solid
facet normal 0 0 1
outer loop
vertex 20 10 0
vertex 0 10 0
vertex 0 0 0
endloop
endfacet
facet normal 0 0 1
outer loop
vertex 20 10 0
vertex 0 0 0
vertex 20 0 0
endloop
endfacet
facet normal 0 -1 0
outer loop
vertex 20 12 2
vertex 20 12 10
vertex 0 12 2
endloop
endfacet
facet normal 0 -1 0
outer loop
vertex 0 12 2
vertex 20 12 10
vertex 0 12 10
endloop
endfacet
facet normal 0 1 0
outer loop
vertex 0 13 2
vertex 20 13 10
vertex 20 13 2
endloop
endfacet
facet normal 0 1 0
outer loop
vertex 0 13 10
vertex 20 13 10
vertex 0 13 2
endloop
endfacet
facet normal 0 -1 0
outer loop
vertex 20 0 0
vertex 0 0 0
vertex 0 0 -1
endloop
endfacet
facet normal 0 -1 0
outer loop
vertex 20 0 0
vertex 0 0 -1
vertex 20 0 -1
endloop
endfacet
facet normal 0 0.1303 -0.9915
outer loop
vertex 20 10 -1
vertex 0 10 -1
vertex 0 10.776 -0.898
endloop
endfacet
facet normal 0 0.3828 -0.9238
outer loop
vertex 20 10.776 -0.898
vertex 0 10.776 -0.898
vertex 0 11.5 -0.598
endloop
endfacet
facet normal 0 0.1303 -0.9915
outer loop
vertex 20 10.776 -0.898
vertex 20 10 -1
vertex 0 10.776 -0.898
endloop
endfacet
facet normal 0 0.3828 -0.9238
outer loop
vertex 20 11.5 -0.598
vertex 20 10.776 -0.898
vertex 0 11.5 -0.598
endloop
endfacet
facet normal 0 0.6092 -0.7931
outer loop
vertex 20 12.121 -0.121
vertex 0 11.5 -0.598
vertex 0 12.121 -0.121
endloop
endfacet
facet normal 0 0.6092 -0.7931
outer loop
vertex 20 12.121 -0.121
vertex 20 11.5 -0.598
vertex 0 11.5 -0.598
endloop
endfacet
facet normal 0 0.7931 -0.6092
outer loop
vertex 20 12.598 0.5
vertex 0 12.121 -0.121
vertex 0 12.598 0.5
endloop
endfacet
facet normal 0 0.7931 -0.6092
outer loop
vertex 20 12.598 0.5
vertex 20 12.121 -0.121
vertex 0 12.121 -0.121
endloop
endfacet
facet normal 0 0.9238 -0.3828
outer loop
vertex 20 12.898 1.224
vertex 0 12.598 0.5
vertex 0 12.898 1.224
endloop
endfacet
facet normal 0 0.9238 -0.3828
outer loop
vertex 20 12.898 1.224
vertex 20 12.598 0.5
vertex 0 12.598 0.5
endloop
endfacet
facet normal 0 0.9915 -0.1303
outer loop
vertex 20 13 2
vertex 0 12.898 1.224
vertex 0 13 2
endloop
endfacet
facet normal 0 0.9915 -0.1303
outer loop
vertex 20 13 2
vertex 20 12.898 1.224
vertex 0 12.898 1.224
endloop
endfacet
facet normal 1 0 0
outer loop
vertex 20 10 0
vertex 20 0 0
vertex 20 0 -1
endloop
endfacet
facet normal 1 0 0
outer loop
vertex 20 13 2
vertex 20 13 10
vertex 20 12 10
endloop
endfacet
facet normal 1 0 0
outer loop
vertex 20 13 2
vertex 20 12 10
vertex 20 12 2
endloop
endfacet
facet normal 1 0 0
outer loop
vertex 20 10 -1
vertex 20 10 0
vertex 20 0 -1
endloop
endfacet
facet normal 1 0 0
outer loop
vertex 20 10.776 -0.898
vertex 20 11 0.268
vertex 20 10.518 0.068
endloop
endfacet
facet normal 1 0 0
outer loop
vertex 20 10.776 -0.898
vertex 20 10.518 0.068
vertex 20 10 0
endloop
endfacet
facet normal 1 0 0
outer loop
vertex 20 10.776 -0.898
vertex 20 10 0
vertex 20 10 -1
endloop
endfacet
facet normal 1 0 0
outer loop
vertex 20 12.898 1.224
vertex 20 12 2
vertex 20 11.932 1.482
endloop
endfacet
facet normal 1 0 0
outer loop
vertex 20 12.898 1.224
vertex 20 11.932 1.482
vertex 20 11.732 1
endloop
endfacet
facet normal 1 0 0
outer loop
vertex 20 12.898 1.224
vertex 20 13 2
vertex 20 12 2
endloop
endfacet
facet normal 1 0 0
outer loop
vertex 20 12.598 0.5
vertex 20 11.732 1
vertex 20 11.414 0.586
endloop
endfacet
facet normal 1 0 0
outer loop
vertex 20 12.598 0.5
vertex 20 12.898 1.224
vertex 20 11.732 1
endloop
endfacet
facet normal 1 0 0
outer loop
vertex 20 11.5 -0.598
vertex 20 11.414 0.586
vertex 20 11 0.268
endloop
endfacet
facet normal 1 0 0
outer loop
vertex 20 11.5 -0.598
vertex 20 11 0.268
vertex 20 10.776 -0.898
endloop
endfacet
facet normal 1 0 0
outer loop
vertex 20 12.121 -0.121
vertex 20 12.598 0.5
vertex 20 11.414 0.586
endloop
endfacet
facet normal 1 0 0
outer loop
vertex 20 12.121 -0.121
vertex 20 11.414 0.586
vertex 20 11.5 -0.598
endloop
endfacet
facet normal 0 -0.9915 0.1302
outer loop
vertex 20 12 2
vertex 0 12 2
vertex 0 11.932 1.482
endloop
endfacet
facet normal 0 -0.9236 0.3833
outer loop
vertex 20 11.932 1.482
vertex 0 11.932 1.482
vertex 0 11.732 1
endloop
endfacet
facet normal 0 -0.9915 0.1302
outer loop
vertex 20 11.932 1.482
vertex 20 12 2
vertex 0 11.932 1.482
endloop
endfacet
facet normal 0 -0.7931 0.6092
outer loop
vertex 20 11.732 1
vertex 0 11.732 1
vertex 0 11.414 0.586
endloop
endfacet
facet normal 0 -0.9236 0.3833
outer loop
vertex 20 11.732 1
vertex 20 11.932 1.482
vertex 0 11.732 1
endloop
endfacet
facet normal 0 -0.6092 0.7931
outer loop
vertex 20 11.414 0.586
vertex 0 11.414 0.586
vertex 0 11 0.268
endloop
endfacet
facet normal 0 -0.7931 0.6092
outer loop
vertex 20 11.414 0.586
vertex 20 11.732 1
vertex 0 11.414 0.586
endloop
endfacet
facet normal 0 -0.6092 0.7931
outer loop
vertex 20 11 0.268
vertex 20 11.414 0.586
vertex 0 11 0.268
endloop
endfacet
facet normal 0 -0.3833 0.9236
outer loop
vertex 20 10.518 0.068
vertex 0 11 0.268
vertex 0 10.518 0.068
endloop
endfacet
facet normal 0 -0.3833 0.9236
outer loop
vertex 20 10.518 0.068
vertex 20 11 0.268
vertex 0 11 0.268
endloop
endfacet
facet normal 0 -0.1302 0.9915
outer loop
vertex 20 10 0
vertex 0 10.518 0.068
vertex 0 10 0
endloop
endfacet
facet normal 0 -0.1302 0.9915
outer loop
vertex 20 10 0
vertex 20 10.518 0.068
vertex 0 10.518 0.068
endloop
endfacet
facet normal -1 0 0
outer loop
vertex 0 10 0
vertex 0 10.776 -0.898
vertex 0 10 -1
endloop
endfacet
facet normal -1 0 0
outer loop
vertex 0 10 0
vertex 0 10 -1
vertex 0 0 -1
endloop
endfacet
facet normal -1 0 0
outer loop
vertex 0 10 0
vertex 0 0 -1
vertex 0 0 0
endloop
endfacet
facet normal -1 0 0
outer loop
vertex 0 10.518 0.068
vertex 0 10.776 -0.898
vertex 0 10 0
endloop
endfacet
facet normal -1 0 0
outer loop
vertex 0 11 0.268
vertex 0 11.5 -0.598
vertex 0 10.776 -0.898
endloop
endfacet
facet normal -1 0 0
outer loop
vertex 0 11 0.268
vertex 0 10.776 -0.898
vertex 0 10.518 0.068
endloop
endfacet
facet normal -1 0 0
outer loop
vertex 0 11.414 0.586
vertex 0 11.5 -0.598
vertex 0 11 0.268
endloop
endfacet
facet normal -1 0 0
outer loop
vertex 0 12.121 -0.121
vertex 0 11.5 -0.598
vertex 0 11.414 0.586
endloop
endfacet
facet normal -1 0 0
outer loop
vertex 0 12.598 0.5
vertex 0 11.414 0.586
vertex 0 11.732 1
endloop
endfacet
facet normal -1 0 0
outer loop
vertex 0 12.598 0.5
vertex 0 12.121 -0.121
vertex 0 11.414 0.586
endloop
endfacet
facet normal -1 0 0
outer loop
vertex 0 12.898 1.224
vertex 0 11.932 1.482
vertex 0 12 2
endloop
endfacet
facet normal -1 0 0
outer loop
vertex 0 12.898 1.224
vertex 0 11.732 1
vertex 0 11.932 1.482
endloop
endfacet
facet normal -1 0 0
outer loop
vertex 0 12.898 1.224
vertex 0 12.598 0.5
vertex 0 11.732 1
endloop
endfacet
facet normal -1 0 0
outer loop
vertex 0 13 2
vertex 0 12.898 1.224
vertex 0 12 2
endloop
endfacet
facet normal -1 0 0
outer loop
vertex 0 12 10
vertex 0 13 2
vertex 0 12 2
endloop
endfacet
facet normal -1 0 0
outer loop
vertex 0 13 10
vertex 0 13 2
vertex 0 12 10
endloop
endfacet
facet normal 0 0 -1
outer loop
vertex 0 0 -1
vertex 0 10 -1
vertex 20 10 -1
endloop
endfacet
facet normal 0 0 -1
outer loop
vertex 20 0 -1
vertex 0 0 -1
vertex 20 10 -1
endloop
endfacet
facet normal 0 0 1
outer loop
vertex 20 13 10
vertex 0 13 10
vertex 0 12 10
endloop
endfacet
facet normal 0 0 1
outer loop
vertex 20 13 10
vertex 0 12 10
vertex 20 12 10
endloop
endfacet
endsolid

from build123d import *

# Parameters (mm, degrees)
SKETCH_1_W            = 20
SKETCH_1_H            = 10
BASEPLATE_DEPTH       = 1
EDGEFLANGE_DEPTH      = 20
EDGEFLANGE_START      = 1
EDGEFLANGE_FLAT_DEPTH = 1


# Sheet-metal steps are written as plain solids
with BuildPart() as part:
    # Sketch 1 → BasePlate (new body)
    with BuildSketch(Plane.XY):
        with Locations((10, 5)):
            Rectangle(SKETCH_1_W, SKETCH_1_H)
    extrude(amount=-BASEPLATE_DEPTH)

    # EdgeFlange bend section (across the edge) → EdgeFlange (add)
    with BuildSketch(Plane(origin=(20, 12, 0), x_dir=(0, -1, 0), z_dir=(-1, 0, 0))):
        with BuildLine():
            Line((-1, 2), (0, 2))
            ThreePointArc((0, 2), (0.585786438, 0.585786438), (2, 0))
            Line((2, 0), (2, -1))
            ThreePointArc((2, -1), (-0.121320344, -0.121320344), (-1, 2))
        make_face()
    extrude(amount=EDGEFLANGE_DEPTH)

    # EdgeFlange profile (on flange) → EdgeFlange flat (add)
    with BuildSketch(Plane(origin=(0, 12, 0), x_dir=(-1, 0, 0), z_dir=(0, 1, 0)).offset(EDGEFLANGE_START)):
        Polygon((-20, 10), (-20, 2), (0, 2), (0, 10), (-2, 10), (-18, 10), align=None)
    extrude(amount=-EDGEFLANGE_FLAT_DEPTH)


solid = part.part
